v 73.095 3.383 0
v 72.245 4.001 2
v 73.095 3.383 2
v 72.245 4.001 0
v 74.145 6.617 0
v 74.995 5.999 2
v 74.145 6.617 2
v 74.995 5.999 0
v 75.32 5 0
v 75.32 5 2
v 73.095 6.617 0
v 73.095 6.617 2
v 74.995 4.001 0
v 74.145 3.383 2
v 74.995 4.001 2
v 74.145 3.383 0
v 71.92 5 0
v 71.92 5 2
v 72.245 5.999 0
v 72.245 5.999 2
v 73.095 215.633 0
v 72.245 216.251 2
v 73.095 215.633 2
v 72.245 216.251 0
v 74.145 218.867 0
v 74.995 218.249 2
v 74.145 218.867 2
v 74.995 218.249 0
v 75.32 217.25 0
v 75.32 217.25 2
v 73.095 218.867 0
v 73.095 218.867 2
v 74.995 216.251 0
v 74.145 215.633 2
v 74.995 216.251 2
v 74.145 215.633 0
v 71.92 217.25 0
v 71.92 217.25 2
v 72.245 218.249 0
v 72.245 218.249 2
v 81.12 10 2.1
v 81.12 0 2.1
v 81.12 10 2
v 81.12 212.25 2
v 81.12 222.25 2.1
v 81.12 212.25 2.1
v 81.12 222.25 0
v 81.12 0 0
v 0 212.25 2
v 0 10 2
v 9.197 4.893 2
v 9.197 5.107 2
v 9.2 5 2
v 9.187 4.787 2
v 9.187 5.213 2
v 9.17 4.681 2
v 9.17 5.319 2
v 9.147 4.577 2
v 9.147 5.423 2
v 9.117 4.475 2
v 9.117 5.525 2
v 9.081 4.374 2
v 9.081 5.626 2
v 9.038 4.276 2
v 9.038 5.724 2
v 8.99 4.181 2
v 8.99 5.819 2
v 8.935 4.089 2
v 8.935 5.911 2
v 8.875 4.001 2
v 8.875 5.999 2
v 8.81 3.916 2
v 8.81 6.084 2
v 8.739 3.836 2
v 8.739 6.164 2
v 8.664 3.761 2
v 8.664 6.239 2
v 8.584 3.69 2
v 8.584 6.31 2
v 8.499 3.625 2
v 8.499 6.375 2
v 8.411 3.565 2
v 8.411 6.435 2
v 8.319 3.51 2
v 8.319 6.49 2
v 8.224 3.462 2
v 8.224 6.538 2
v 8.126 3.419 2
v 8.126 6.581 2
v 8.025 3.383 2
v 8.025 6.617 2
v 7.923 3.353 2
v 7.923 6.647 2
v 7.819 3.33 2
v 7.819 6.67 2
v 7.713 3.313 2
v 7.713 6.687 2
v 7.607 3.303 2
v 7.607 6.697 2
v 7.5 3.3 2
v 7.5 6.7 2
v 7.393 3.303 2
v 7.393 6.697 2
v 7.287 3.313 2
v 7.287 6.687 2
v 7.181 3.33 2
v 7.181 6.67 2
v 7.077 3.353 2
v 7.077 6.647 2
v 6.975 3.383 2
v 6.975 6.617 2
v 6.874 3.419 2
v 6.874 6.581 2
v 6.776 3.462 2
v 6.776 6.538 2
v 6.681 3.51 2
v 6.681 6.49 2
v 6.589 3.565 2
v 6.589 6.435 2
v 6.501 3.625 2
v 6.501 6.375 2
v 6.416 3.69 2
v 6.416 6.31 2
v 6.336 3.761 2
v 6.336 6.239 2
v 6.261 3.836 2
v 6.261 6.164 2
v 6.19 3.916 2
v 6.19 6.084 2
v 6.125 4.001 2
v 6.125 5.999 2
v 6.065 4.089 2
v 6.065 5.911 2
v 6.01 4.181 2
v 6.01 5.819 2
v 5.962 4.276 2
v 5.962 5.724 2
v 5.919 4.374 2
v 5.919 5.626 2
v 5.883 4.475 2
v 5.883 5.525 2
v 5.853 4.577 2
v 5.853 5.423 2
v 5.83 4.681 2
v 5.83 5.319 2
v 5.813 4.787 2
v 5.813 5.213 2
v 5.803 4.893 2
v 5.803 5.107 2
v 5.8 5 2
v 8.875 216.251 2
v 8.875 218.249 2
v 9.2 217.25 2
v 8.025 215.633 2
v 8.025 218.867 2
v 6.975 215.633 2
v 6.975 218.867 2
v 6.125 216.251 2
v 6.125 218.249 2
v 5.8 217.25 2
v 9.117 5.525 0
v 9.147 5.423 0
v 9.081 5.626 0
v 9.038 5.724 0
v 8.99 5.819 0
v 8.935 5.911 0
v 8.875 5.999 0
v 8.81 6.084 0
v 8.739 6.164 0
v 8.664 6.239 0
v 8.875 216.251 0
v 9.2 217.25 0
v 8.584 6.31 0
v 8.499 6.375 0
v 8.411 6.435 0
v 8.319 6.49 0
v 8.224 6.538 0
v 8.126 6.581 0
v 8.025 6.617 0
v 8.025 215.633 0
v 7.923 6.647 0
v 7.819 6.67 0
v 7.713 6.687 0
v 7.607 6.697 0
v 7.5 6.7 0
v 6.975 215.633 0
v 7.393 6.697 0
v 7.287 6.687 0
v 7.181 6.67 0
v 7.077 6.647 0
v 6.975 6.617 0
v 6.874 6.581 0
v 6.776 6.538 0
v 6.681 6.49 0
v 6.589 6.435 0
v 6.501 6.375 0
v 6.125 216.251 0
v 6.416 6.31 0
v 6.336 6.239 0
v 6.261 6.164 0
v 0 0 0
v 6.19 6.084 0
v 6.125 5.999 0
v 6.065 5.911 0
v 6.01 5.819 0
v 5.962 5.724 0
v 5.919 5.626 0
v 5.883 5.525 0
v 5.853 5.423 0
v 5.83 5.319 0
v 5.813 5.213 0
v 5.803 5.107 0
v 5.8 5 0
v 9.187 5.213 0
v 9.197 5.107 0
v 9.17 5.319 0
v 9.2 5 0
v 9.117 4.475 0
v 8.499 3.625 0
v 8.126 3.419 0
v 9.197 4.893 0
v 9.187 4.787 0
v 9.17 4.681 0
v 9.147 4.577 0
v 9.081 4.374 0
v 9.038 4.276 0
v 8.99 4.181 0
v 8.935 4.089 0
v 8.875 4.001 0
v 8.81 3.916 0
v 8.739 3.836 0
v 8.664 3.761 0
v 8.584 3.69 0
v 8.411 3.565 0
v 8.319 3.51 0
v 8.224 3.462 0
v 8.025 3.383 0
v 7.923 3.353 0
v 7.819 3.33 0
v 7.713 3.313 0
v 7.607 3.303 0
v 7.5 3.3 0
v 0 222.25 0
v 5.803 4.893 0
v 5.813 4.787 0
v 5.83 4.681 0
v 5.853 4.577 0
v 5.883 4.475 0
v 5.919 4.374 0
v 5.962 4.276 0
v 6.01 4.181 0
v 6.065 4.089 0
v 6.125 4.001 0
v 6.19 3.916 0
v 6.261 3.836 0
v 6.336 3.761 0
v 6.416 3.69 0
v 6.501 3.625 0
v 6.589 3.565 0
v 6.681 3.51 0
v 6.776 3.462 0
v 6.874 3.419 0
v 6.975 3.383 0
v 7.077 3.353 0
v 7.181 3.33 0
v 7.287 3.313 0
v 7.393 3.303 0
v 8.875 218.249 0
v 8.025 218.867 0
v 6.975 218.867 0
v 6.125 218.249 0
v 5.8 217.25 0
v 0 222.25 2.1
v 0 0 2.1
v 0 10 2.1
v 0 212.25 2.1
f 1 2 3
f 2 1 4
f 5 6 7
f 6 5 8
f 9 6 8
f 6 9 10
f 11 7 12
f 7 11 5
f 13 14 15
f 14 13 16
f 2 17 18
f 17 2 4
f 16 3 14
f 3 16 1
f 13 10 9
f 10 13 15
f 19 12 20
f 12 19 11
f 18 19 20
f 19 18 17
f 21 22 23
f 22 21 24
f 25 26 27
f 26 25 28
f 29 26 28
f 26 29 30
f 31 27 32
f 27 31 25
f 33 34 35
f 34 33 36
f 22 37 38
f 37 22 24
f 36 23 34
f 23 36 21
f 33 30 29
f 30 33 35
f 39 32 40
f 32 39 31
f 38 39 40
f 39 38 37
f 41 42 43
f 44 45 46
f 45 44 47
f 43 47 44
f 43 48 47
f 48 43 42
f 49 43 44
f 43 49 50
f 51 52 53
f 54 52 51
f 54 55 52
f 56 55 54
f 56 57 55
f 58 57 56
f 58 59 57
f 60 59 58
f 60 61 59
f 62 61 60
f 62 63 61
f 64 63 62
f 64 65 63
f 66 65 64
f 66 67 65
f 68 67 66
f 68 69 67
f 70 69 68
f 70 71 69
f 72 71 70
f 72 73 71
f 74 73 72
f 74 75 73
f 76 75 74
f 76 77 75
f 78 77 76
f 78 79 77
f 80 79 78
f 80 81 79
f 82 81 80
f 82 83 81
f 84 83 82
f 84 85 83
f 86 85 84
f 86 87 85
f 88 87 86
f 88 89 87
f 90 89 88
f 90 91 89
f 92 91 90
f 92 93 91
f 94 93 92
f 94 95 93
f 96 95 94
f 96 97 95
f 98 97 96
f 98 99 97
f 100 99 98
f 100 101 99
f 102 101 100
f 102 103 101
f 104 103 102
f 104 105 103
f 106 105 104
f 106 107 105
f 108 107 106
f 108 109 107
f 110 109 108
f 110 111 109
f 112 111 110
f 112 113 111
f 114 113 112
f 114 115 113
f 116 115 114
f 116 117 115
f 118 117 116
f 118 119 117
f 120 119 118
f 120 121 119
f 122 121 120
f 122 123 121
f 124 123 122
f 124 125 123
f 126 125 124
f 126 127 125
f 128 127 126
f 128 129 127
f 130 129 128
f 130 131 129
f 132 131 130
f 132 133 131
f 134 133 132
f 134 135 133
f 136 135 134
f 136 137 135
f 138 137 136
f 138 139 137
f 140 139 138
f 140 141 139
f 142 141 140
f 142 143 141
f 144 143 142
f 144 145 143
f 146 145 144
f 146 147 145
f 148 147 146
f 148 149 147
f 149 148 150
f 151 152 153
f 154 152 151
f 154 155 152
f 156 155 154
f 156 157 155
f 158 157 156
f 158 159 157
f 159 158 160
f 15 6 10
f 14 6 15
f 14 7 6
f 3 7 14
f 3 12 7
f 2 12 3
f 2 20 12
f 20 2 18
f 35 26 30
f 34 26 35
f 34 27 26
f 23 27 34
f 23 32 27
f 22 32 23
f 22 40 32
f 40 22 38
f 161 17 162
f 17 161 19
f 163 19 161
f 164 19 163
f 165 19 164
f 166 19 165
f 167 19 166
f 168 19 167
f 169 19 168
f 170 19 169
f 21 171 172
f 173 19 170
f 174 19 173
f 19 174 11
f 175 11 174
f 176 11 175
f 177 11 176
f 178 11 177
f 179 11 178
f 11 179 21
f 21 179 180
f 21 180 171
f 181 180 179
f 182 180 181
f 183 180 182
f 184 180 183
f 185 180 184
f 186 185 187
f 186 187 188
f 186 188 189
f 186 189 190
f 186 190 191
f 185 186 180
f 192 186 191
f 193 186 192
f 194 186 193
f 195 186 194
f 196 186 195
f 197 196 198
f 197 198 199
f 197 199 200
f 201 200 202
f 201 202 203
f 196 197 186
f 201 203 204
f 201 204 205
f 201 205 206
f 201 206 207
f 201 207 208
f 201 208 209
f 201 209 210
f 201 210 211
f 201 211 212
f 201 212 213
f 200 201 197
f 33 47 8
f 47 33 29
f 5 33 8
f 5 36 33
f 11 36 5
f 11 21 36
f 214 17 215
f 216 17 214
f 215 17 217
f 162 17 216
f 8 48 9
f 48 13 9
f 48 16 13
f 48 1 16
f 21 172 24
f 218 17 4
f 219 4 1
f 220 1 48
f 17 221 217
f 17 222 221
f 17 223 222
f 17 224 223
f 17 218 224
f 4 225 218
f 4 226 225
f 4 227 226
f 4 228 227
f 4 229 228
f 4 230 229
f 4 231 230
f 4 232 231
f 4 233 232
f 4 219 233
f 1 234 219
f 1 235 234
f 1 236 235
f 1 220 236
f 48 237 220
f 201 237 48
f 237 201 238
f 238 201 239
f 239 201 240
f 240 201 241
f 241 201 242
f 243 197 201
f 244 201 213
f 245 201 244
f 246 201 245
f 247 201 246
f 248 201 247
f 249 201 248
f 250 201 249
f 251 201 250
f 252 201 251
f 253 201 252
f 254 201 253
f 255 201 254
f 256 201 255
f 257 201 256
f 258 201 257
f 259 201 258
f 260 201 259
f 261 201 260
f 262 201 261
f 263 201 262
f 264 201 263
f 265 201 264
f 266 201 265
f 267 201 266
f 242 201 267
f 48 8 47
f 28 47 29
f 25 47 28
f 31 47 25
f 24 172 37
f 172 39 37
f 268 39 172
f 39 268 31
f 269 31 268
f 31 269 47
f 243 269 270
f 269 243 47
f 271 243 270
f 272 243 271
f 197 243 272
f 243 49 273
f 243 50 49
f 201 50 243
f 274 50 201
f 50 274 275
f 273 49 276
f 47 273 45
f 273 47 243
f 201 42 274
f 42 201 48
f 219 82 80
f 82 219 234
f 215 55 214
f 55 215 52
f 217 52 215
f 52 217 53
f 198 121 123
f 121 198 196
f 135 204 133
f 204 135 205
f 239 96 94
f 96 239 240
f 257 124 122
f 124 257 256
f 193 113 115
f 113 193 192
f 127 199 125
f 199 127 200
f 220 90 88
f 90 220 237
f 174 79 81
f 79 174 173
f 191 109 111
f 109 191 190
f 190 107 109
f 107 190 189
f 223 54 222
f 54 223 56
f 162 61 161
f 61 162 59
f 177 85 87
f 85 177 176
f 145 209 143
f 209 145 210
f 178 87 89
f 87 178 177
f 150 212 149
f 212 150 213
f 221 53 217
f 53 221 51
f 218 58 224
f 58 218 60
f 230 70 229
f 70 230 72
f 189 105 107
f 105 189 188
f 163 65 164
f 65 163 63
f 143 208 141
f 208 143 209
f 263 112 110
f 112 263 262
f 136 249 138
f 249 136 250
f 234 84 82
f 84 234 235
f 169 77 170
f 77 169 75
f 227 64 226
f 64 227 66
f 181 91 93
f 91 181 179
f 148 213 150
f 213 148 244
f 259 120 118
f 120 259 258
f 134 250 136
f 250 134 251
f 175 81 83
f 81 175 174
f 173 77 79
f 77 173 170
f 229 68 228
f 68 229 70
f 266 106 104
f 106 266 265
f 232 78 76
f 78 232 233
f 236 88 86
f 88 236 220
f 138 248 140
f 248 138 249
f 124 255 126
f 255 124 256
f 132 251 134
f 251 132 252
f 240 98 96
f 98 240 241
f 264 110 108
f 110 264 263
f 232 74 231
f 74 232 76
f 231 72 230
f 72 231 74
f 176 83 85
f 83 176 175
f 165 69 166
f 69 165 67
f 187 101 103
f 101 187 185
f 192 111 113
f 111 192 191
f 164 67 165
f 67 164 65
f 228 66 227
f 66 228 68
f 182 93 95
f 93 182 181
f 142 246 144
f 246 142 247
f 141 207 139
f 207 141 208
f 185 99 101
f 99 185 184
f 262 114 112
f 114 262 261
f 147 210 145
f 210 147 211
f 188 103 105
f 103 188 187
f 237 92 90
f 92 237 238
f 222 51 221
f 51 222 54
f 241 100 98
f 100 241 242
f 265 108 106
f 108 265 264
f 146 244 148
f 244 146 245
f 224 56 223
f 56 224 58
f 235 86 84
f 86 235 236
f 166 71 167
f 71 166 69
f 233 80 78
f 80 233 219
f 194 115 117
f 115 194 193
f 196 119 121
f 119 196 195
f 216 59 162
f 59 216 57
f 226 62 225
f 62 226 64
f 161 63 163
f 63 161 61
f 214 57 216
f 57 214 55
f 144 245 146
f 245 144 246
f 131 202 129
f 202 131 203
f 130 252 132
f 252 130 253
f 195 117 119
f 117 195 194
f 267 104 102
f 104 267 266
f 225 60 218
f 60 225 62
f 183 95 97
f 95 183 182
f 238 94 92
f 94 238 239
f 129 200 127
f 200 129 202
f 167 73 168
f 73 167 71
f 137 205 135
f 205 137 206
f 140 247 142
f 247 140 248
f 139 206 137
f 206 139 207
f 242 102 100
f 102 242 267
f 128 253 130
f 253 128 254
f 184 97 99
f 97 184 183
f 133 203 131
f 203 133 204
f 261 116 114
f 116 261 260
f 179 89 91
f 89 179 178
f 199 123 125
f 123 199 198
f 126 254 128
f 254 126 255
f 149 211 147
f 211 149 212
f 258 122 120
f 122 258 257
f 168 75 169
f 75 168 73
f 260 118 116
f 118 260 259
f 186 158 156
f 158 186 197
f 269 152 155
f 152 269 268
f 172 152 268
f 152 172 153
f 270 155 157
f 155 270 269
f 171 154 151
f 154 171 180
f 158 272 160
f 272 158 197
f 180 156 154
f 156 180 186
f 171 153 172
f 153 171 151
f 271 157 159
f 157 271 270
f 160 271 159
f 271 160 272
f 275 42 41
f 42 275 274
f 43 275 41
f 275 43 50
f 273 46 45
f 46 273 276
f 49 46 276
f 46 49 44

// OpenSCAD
/** 
 * The panel plate
 */

HP_SIZE = 5.07;
HU_SIZE = 44.45;

HOLE_R = 1.7;
SCREEW_R = 3;
HOLE_FROM_SIDE = 7.5;
HOLE_FROM_TOP = 5;

module plate_first_layer(HP=1,HU=5,thickness=2,layer=0.3) {
	height=HU*HU_SIZE;
	width=HP*HP_SIZE;
	cube([width, height, layer]);
}

module plate(HP=1,HU=5,thickness=2,armatures=false,screew=SCREEW_R) {

	height=HU*HU_SIZE;
	width=HP*HP_SIZE;

	difference() {
		cube([width, height, thickness]);

		translate([HOLE_FROM_SIDE, HOLE_FROM_TOP, -1]) {
			cylinder(r=HOLE_R, h=10, $fn=100);
		}
			

		translate([HOLE_FROM_SIDE, height-HOLE_FROM_TOP, -1]) {
			cylinder(r=HOLE_R, h=10, $fn=10);
		}

		if (width > 50) {
			translate([width-HOLE_FROM_SIDE, HOLE_FROM_TOP, -1]) {
				cylinder(r=HOLE_R, h=10, $fn=10);
			}

			translate([width-HOLE_FROM_SIDE, height-HOLE_FROM_TOP, -1]) {
				cylinder(r=HOLE_R, h=10, $fn=10);
			}
		}
	}

	if( armatures ) {
		translate([0,0,thickness]) color("red") cube([width, 10, 0.1]);
		translate([0,height-10,thickness]) color("red")  cube([width, 10, 0.1]);
	}
}

plate(HP=16,armatures=true);
